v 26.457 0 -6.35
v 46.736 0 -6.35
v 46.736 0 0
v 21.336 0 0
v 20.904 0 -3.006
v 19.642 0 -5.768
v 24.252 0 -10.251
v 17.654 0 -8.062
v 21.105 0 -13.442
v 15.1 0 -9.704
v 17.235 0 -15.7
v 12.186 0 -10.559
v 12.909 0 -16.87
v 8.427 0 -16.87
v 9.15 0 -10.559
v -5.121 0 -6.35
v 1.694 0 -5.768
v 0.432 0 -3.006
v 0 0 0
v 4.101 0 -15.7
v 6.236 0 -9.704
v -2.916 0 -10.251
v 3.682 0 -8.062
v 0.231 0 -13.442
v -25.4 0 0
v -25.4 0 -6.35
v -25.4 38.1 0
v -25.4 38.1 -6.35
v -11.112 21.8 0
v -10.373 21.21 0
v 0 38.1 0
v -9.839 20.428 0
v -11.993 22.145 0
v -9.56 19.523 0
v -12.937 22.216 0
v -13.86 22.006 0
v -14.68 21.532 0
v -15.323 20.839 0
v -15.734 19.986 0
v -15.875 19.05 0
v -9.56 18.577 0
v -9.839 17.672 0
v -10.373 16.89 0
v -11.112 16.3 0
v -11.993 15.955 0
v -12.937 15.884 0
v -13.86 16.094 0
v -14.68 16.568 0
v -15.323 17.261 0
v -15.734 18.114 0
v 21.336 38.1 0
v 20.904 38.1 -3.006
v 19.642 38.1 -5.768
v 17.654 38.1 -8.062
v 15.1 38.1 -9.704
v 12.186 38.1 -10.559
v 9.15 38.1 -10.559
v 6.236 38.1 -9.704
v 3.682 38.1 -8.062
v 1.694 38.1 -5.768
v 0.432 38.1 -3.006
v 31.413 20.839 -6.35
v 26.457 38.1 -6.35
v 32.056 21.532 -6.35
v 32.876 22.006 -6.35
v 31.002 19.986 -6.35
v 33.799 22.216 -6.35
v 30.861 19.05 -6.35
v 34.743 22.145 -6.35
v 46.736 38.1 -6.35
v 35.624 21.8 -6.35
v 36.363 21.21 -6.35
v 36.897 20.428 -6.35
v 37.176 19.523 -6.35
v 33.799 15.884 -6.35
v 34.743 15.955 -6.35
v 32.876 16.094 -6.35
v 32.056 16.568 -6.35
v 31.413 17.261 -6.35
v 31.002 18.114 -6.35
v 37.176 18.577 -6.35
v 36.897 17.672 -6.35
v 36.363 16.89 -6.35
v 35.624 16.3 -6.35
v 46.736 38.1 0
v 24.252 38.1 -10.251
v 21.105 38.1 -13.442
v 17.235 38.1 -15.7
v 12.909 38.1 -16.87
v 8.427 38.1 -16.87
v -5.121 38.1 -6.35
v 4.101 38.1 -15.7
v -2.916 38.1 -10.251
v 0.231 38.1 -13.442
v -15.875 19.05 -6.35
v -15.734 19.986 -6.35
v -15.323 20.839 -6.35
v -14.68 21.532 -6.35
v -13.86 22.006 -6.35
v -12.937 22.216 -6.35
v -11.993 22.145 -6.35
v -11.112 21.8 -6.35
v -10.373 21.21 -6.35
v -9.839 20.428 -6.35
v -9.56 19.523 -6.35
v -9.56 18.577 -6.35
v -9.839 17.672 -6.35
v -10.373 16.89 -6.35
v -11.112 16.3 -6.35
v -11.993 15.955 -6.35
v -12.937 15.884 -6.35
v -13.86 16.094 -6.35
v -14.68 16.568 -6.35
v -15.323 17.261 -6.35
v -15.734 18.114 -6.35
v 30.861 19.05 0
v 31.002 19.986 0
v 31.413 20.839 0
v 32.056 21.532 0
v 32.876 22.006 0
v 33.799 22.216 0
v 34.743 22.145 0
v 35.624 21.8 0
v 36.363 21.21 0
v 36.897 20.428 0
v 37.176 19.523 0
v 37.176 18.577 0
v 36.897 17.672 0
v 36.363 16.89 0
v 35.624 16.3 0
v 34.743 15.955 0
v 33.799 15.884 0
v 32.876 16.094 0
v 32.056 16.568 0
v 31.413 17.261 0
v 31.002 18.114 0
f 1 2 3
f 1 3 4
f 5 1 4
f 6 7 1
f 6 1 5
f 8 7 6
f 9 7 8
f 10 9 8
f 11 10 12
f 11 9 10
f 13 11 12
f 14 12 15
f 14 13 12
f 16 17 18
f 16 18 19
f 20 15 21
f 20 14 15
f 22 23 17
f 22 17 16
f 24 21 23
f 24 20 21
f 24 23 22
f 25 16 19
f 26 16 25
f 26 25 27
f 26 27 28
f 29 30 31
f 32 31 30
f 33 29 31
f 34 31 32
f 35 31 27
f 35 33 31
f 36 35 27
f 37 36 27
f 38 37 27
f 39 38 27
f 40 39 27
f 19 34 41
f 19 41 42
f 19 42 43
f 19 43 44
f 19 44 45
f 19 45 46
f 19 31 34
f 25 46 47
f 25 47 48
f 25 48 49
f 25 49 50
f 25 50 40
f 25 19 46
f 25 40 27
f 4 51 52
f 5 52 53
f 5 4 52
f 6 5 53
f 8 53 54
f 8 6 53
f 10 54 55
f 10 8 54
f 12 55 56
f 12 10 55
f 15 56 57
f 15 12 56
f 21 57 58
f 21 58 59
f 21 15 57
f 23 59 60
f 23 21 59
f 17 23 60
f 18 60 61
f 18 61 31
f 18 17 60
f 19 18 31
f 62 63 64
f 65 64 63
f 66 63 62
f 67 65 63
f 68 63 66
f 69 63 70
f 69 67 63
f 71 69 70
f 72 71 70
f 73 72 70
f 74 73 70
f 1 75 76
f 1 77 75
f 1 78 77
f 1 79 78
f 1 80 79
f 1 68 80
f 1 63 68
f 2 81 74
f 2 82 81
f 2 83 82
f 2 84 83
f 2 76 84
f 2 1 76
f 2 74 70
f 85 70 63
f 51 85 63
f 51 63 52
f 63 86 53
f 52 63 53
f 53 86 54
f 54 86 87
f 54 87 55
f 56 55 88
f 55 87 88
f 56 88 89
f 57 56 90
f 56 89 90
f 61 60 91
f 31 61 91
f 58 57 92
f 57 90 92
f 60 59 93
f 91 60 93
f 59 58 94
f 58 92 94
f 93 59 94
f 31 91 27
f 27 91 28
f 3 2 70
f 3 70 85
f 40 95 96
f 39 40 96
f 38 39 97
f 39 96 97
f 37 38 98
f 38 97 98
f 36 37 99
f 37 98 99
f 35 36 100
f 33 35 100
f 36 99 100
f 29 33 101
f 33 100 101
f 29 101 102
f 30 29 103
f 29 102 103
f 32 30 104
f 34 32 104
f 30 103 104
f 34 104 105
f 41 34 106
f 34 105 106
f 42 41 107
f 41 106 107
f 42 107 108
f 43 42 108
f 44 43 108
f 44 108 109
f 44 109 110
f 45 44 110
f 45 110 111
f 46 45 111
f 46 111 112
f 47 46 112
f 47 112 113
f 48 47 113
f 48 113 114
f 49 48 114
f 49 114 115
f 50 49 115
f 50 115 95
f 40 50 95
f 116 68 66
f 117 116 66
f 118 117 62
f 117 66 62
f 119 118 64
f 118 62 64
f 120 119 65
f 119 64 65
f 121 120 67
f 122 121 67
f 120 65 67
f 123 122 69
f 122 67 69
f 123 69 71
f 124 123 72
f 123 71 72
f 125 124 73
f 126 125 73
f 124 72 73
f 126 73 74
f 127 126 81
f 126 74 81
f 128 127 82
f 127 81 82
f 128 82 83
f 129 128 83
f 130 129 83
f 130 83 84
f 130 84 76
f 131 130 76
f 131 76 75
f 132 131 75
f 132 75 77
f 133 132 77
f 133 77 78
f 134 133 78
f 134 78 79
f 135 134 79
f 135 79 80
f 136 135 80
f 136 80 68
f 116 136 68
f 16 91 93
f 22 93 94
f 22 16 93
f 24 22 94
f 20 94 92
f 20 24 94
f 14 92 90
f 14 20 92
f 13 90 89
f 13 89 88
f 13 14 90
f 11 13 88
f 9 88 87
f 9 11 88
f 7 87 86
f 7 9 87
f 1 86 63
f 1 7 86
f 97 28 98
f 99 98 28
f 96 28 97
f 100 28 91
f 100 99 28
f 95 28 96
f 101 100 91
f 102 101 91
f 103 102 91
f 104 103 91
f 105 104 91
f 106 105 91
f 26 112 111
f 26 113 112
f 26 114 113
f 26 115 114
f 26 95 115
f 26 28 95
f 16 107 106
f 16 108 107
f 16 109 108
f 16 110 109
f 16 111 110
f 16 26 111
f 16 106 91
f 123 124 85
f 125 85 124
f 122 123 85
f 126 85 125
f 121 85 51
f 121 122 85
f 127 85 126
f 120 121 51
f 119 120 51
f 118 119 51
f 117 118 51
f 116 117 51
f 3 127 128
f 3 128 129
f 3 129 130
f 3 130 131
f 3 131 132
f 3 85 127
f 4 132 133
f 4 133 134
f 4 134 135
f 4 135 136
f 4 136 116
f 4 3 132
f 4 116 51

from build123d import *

# Parameters (mm, degrees)
BOSS_EXTRUDE1_DEPTH = 38.1
SKETCH2_R           = 3.175
CUT_EXTRUDE1_DEPTH  = 38.1
SKETCH3_R           = 3.175
CUT_EXTRUDE2_DEPTH  = 62.234548418


with BuildPart() as part:
    # Sketch1 → Boss-Extrude1 (new body)
    with BuildSketch(Plane(origin=(0, 0, 0), x_dir=(1, 0, 0), z_dir=(0, 1, 0))):
        with BuildLine():
            Line((0, 0), (-25.4, 0))
            Line((-25.4, 0), (-25.4, 6.35))
            Line((-25.4, 6.35), (-5.120914592, 6.35))
            ThreePointArc((-5.120914592, 6.35), (10.668, 17.018), (26.456914592, 6.35))
            Line((26.456914592, 6.35), (46.736, 6.35))
            Line((46.736, 6.35), (46.736, 0))
            Line((46.736, 0), (21.336, 0))
            ThreePointArc((21.336, 0), (10.668, 10.668), (0, 0))
        make_face()
    extrude(amount=BOSS_EXTRUDE1_DEPTH)

    # Sketch2 → Cut-Extrude1 (cut)
    with BuildSketch(Plane(origin=(0, 0, -6.35), x_dir=(-1, 0, 0), z_dir=(0, 0, -1))):
        with Locations((12.7, 19.05)):
            Circle(SKETCH2_R)
    extrude(amount=-CUT_EXTRUDE1_DEPTH, mode=Mode.SUBTRACT)

    # Sketch3 → Cut-Extrude2 (cut, through all)
    with BuildSketch(Plane(origin=(0, 0, -6.35), x_dir=(-1, 0, 0), z_dir=(0, 0, -1))):
        with Locations((-34.036, 19.05)):
            Circle(SKETCH3_R)
    extrude(amount=-CUT_EXTRUDE2_DEPTH, mode=Mode.SUBTRACT)


solid = part.part
